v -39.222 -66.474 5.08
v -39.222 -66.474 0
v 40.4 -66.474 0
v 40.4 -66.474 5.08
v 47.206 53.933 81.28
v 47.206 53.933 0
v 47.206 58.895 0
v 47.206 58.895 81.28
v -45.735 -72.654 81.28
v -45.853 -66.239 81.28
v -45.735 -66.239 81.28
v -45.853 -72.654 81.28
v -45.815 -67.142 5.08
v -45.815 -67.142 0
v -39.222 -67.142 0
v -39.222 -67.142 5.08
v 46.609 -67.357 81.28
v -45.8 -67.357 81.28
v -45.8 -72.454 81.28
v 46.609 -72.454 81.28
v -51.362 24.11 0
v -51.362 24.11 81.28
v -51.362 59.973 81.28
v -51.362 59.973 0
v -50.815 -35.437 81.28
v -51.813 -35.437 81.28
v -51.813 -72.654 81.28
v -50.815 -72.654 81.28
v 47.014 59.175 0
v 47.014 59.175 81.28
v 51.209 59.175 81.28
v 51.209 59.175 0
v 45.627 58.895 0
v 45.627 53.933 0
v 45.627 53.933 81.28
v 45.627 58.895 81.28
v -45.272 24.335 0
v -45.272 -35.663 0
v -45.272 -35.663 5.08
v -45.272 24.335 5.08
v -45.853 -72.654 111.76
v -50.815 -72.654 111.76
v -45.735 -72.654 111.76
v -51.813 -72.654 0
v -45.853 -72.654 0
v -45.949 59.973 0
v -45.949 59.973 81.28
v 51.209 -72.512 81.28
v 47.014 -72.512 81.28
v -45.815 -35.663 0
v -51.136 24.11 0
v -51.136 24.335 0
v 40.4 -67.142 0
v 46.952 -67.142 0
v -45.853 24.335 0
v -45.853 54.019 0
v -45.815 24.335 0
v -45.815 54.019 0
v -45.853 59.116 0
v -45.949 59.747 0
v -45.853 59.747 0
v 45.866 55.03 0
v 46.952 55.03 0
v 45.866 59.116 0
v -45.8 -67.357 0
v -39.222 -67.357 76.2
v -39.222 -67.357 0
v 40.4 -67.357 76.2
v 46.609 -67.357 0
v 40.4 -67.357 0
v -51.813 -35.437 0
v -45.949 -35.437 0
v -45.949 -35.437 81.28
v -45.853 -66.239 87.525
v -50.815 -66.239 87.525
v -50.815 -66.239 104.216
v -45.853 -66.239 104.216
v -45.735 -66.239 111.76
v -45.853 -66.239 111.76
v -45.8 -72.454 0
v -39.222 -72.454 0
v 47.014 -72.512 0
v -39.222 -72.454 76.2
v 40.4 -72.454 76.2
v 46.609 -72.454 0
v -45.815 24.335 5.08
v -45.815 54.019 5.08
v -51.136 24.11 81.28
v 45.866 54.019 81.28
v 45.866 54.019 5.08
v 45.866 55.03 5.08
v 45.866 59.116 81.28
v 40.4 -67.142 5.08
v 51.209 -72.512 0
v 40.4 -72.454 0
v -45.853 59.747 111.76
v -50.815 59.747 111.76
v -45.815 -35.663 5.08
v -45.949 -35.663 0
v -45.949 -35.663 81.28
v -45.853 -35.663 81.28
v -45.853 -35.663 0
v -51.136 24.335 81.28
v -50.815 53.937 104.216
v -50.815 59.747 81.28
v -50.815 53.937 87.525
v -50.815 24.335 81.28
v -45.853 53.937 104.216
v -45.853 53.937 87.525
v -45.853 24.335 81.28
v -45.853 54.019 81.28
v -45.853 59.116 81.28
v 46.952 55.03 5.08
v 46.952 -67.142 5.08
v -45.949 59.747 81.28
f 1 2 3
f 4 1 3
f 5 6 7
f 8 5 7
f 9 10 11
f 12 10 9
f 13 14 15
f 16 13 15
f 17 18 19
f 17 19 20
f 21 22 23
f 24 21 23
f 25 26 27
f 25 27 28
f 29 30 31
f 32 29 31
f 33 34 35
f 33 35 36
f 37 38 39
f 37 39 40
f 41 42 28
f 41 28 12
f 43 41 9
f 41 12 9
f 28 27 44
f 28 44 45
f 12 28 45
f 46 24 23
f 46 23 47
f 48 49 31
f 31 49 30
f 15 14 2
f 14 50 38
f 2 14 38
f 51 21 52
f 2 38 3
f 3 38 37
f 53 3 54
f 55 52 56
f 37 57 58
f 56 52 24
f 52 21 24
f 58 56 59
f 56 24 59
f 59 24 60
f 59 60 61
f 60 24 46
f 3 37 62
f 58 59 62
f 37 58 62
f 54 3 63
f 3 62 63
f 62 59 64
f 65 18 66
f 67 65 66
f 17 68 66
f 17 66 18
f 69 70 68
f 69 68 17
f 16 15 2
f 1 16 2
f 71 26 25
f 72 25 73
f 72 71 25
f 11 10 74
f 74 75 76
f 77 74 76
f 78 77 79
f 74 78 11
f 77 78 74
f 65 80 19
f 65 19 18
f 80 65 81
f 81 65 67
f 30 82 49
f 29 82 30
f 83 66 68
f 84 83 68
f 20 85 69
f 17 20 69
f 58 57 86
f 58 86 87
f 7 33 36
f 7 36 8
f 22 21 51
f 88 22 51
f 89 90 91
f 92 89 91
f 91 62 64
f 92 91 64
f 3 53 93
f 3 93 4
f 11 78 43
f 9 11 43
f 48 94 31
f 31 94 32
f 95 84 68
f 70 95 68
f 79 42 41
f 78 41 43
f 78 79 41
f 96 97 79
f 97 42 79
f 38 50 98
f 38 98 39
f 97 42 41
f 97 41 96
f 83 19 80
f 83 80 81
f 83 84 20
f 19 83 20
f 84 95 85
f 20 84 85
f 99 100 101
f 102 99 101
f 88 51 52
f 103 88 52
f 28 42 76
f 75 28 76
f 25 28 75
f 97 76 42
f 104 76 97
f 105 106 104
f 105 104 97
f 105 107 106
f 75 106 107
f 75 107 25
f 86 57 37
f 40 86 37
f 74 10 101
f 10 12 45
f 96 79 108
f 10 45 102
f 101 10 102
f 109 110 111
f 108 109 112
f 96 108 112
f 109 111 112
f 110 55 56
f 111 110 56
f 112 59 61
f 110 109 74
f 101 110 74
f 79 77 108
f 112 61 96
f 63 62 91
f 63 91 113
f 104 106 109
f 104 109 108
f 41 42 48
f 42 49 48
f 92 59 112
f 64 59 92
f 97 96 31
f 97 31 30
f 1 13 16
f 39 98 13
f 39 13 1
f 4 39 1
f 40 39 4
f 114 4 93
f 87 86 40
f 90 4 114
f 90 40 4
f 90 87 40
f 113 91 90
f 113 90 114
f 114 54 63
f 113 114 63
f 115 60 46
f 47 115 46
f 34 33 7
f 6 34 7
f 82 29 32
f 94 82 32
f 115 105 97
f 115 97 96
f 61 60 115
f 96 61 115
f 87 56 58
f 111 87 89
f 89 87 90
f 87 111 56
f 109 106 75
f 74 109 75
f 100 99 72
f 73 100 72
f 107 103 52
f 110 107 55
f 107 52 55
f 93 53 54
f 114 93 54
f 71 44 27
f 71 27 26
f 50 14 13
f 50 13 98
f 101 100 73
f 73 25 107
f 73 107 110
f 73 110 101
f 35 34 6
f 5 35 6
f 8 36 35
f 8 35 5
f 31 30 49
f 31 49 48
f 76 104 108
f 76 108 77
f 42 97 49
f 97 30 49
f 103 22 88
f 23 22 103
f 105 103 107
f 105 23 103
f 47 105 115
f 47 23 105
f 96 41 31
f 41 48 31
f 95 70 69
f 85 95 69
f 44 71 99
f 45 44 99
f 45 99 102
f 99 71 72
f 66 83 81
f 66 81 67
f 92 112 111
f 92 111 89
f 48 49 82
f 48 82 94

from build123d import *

# Parameters (mm, degrees)
F0_W       = 91.7312130332
F0_H       = 5.0961747766
F1_DEPTH   = 81.28
F2_W       = 92.7664116025
F2_H       = 122.1723817289
F3_DEPTH   = 5.08
F4_W       = 92.4087017775
F4_H       = 5.0977095962
F5_DEPTH   = 81.28
F6_W       = 4.1953362525
F6_H       = 131.6875554621
F7_DEPTH   = 81.28
F8_W       = 1.5788935125
F8_H       = 4.9622580409
F9_DEPTH   = 81.28
F10_W      = 4.9622431397
F10_H      = 132.4018239975
F11_DEPTH  = 111.76
F11_FACE_W = 4.9622431397
F11_FACE_H = 132.4018239975
F7_FACE_W  = 4.1953362525
F7_FACE_H  = 131.6875554621
F13_W      = 5.413364619
F13_H      = 35.8635243028
F14_DEPTH  = 81.28
F15_W      = 5.8644749224
F15_H      = 59.9981006235
F16_DEPTH  = 81.28
F17_W      = 5.8644749224
F17_H      = 37.2168645263
F18_DEPTH  = 81.28
F19_W      = 79.6215347946
F19_H      = 6.5411478281
F20_DEPTH  = 76.2
F21_W      = 120.1766468585
F21_H      = 16.6912078857
F22_DEPTH  = 7.62
F23_W      = 6.415002048
F23_H      = 30.48
F24_DEPTH  = 5.08


with BuildPart() as f1:
    # F0 (on Top) → F1 (new body)
    with BuildSketch(Plane.XY):
        with Locations((0, 56.5675832331)):
            Rectangle(F0_W, F0_H)
    extrude(amount=F1_DEPTH)

    # F2 (on Top) → F3 (join)
    with BuildSketch(Plane.XY):
        with Locations((0.5685612559, -6.0559604317)):
            Rectangle(F2_W, F2_H)
    extrude(amount=F3_DEPTH)

    # F10 (on Top) → F11 (join)
    with BuildSketch(Plane.XY):
        with Locations((-48.3341515064, -6.4534246922)):
            Rectangle(F10_W, F10_H)
    extrude(amount=F11_DEPTH)

    # F13 (on Top) → F14 (join)
    with BuildSketch(Plane.XY):
        with Locations((-48.6552622169, 42.0412803069)):
            Rectangle(F13_W, F13_H)
    extrude(amount=F14_DEPTH)

    # F15 (on Top) → F16 (cut)
    with BuildSketch(Plane.XY):
        with Locations((-48.2041481882, -5.6639770046)):
            Rectangle(F15_W, F15_H)
    extrude(amount=F16_DEPTH, mode=Mode.SUBTRACT)

    # F17 (on Top) → F18 (join)
    with BuildSketch(Plane.XY):
        with Locations((-48.8808173686, -54.0459044278)):
            Rectangle(F17_W, F17_H)
    extrude(amount=F18_DEPTH)


with BuildPart() as f5:
    # F4 (on Top) → F5 (new body)
    with BuildSketch(Plane.XY):
        with Locations((0.404253602, -69.9054412544)):
            Rectangle(F4_W, F4_H)
    extrude(amount=F5_DEPTH)


with BuildPart() as f7:
    # F6 (on Top) → F7 (new body)
    with BuildSketch(Plane.XY):
        with Locations((49.1117332131, -6.6685359925)):
            Rectangle(F6_W, F6_H)
    extrude(amount=F7_DEPTH)


with BuildPart() as f9:
    # F8 (on Top) → F9 (new body)
    with BuildSketch(Plane.XY):
        with Locations((46.4169178158, 56.4142502844)):
            Rectangle(F8_W, F8_H)
    extrude(amount=F9_DEPTH)


with BuildPart() as f12:
    # F11_face (on face) → F12 section 0
    with BuildSketch(Plane(origin=(-48.3341515064, -6.4534246922, 111.76), x_dir=(1, 0, 0), z_dir=(0, 0, 1))):
        Rectangle(F11_FACE_W, F11_FACE_H)
    # F7_face (on face) → F12 section 1
    with BuildSketch(Plane(origin=(49.1117332131, -6.6685359925, 81.28), x_dir=(1, 0, 0), z_dir=(0, 0, 1))):
        Rectangle(F7_FACE_W, F7_FACE_H)
    loft()


with BuildPart() as f20_tool:
    # F19 (on Top) → F20 (new body)
    with BuildSketch(Plane.XY):
        with Locations((0.5889479071, -69.7448179126)):
            Rectangle(F19_W, F19_H)
    extrude(amount=F20_DEPTH)


with BuildPart() as f1_1:
    add(f1.part)

    # F20: cut by f20_tool
    add(f20_tool.part, mode=Mode.SUBTRACT)

    # F21 (on face) → F22 (cut)
    with BuildSketch(Plane(origin=(-50.8152730763, 0, 0), x_dir=(0, -1, 0), z_dir=(-1, 0, 0))):
        with Locations((6.1510112137, 95.8702862263)):
            Rectangle(F21_W, F21_H)
    extrude(amount=-F22_DEPTH, mode=Mode.SUBTRACT)

    # F23 (on face) → F24 (join)
    with BuildSketch(Plane(origin=(-50.8152730763, 0, 0), x_dir=(0, -1, 0), z_dir=(-1, 0, 0))):
        with Locations((69.4468356669, 96.52)):
            Rectangle(F23_W, F23_H)
    extrude(amount=-F24_DEPTH)


with BuildPart() as f5_1:
    add(f5.part)

    # F20: cut by f20_tool
    add(f20_tool.part, mode=Mode.SUBTRACT)


solid = Compound([f7.part, f9.part, f12.part, f1_1.part, f5_1.part])
